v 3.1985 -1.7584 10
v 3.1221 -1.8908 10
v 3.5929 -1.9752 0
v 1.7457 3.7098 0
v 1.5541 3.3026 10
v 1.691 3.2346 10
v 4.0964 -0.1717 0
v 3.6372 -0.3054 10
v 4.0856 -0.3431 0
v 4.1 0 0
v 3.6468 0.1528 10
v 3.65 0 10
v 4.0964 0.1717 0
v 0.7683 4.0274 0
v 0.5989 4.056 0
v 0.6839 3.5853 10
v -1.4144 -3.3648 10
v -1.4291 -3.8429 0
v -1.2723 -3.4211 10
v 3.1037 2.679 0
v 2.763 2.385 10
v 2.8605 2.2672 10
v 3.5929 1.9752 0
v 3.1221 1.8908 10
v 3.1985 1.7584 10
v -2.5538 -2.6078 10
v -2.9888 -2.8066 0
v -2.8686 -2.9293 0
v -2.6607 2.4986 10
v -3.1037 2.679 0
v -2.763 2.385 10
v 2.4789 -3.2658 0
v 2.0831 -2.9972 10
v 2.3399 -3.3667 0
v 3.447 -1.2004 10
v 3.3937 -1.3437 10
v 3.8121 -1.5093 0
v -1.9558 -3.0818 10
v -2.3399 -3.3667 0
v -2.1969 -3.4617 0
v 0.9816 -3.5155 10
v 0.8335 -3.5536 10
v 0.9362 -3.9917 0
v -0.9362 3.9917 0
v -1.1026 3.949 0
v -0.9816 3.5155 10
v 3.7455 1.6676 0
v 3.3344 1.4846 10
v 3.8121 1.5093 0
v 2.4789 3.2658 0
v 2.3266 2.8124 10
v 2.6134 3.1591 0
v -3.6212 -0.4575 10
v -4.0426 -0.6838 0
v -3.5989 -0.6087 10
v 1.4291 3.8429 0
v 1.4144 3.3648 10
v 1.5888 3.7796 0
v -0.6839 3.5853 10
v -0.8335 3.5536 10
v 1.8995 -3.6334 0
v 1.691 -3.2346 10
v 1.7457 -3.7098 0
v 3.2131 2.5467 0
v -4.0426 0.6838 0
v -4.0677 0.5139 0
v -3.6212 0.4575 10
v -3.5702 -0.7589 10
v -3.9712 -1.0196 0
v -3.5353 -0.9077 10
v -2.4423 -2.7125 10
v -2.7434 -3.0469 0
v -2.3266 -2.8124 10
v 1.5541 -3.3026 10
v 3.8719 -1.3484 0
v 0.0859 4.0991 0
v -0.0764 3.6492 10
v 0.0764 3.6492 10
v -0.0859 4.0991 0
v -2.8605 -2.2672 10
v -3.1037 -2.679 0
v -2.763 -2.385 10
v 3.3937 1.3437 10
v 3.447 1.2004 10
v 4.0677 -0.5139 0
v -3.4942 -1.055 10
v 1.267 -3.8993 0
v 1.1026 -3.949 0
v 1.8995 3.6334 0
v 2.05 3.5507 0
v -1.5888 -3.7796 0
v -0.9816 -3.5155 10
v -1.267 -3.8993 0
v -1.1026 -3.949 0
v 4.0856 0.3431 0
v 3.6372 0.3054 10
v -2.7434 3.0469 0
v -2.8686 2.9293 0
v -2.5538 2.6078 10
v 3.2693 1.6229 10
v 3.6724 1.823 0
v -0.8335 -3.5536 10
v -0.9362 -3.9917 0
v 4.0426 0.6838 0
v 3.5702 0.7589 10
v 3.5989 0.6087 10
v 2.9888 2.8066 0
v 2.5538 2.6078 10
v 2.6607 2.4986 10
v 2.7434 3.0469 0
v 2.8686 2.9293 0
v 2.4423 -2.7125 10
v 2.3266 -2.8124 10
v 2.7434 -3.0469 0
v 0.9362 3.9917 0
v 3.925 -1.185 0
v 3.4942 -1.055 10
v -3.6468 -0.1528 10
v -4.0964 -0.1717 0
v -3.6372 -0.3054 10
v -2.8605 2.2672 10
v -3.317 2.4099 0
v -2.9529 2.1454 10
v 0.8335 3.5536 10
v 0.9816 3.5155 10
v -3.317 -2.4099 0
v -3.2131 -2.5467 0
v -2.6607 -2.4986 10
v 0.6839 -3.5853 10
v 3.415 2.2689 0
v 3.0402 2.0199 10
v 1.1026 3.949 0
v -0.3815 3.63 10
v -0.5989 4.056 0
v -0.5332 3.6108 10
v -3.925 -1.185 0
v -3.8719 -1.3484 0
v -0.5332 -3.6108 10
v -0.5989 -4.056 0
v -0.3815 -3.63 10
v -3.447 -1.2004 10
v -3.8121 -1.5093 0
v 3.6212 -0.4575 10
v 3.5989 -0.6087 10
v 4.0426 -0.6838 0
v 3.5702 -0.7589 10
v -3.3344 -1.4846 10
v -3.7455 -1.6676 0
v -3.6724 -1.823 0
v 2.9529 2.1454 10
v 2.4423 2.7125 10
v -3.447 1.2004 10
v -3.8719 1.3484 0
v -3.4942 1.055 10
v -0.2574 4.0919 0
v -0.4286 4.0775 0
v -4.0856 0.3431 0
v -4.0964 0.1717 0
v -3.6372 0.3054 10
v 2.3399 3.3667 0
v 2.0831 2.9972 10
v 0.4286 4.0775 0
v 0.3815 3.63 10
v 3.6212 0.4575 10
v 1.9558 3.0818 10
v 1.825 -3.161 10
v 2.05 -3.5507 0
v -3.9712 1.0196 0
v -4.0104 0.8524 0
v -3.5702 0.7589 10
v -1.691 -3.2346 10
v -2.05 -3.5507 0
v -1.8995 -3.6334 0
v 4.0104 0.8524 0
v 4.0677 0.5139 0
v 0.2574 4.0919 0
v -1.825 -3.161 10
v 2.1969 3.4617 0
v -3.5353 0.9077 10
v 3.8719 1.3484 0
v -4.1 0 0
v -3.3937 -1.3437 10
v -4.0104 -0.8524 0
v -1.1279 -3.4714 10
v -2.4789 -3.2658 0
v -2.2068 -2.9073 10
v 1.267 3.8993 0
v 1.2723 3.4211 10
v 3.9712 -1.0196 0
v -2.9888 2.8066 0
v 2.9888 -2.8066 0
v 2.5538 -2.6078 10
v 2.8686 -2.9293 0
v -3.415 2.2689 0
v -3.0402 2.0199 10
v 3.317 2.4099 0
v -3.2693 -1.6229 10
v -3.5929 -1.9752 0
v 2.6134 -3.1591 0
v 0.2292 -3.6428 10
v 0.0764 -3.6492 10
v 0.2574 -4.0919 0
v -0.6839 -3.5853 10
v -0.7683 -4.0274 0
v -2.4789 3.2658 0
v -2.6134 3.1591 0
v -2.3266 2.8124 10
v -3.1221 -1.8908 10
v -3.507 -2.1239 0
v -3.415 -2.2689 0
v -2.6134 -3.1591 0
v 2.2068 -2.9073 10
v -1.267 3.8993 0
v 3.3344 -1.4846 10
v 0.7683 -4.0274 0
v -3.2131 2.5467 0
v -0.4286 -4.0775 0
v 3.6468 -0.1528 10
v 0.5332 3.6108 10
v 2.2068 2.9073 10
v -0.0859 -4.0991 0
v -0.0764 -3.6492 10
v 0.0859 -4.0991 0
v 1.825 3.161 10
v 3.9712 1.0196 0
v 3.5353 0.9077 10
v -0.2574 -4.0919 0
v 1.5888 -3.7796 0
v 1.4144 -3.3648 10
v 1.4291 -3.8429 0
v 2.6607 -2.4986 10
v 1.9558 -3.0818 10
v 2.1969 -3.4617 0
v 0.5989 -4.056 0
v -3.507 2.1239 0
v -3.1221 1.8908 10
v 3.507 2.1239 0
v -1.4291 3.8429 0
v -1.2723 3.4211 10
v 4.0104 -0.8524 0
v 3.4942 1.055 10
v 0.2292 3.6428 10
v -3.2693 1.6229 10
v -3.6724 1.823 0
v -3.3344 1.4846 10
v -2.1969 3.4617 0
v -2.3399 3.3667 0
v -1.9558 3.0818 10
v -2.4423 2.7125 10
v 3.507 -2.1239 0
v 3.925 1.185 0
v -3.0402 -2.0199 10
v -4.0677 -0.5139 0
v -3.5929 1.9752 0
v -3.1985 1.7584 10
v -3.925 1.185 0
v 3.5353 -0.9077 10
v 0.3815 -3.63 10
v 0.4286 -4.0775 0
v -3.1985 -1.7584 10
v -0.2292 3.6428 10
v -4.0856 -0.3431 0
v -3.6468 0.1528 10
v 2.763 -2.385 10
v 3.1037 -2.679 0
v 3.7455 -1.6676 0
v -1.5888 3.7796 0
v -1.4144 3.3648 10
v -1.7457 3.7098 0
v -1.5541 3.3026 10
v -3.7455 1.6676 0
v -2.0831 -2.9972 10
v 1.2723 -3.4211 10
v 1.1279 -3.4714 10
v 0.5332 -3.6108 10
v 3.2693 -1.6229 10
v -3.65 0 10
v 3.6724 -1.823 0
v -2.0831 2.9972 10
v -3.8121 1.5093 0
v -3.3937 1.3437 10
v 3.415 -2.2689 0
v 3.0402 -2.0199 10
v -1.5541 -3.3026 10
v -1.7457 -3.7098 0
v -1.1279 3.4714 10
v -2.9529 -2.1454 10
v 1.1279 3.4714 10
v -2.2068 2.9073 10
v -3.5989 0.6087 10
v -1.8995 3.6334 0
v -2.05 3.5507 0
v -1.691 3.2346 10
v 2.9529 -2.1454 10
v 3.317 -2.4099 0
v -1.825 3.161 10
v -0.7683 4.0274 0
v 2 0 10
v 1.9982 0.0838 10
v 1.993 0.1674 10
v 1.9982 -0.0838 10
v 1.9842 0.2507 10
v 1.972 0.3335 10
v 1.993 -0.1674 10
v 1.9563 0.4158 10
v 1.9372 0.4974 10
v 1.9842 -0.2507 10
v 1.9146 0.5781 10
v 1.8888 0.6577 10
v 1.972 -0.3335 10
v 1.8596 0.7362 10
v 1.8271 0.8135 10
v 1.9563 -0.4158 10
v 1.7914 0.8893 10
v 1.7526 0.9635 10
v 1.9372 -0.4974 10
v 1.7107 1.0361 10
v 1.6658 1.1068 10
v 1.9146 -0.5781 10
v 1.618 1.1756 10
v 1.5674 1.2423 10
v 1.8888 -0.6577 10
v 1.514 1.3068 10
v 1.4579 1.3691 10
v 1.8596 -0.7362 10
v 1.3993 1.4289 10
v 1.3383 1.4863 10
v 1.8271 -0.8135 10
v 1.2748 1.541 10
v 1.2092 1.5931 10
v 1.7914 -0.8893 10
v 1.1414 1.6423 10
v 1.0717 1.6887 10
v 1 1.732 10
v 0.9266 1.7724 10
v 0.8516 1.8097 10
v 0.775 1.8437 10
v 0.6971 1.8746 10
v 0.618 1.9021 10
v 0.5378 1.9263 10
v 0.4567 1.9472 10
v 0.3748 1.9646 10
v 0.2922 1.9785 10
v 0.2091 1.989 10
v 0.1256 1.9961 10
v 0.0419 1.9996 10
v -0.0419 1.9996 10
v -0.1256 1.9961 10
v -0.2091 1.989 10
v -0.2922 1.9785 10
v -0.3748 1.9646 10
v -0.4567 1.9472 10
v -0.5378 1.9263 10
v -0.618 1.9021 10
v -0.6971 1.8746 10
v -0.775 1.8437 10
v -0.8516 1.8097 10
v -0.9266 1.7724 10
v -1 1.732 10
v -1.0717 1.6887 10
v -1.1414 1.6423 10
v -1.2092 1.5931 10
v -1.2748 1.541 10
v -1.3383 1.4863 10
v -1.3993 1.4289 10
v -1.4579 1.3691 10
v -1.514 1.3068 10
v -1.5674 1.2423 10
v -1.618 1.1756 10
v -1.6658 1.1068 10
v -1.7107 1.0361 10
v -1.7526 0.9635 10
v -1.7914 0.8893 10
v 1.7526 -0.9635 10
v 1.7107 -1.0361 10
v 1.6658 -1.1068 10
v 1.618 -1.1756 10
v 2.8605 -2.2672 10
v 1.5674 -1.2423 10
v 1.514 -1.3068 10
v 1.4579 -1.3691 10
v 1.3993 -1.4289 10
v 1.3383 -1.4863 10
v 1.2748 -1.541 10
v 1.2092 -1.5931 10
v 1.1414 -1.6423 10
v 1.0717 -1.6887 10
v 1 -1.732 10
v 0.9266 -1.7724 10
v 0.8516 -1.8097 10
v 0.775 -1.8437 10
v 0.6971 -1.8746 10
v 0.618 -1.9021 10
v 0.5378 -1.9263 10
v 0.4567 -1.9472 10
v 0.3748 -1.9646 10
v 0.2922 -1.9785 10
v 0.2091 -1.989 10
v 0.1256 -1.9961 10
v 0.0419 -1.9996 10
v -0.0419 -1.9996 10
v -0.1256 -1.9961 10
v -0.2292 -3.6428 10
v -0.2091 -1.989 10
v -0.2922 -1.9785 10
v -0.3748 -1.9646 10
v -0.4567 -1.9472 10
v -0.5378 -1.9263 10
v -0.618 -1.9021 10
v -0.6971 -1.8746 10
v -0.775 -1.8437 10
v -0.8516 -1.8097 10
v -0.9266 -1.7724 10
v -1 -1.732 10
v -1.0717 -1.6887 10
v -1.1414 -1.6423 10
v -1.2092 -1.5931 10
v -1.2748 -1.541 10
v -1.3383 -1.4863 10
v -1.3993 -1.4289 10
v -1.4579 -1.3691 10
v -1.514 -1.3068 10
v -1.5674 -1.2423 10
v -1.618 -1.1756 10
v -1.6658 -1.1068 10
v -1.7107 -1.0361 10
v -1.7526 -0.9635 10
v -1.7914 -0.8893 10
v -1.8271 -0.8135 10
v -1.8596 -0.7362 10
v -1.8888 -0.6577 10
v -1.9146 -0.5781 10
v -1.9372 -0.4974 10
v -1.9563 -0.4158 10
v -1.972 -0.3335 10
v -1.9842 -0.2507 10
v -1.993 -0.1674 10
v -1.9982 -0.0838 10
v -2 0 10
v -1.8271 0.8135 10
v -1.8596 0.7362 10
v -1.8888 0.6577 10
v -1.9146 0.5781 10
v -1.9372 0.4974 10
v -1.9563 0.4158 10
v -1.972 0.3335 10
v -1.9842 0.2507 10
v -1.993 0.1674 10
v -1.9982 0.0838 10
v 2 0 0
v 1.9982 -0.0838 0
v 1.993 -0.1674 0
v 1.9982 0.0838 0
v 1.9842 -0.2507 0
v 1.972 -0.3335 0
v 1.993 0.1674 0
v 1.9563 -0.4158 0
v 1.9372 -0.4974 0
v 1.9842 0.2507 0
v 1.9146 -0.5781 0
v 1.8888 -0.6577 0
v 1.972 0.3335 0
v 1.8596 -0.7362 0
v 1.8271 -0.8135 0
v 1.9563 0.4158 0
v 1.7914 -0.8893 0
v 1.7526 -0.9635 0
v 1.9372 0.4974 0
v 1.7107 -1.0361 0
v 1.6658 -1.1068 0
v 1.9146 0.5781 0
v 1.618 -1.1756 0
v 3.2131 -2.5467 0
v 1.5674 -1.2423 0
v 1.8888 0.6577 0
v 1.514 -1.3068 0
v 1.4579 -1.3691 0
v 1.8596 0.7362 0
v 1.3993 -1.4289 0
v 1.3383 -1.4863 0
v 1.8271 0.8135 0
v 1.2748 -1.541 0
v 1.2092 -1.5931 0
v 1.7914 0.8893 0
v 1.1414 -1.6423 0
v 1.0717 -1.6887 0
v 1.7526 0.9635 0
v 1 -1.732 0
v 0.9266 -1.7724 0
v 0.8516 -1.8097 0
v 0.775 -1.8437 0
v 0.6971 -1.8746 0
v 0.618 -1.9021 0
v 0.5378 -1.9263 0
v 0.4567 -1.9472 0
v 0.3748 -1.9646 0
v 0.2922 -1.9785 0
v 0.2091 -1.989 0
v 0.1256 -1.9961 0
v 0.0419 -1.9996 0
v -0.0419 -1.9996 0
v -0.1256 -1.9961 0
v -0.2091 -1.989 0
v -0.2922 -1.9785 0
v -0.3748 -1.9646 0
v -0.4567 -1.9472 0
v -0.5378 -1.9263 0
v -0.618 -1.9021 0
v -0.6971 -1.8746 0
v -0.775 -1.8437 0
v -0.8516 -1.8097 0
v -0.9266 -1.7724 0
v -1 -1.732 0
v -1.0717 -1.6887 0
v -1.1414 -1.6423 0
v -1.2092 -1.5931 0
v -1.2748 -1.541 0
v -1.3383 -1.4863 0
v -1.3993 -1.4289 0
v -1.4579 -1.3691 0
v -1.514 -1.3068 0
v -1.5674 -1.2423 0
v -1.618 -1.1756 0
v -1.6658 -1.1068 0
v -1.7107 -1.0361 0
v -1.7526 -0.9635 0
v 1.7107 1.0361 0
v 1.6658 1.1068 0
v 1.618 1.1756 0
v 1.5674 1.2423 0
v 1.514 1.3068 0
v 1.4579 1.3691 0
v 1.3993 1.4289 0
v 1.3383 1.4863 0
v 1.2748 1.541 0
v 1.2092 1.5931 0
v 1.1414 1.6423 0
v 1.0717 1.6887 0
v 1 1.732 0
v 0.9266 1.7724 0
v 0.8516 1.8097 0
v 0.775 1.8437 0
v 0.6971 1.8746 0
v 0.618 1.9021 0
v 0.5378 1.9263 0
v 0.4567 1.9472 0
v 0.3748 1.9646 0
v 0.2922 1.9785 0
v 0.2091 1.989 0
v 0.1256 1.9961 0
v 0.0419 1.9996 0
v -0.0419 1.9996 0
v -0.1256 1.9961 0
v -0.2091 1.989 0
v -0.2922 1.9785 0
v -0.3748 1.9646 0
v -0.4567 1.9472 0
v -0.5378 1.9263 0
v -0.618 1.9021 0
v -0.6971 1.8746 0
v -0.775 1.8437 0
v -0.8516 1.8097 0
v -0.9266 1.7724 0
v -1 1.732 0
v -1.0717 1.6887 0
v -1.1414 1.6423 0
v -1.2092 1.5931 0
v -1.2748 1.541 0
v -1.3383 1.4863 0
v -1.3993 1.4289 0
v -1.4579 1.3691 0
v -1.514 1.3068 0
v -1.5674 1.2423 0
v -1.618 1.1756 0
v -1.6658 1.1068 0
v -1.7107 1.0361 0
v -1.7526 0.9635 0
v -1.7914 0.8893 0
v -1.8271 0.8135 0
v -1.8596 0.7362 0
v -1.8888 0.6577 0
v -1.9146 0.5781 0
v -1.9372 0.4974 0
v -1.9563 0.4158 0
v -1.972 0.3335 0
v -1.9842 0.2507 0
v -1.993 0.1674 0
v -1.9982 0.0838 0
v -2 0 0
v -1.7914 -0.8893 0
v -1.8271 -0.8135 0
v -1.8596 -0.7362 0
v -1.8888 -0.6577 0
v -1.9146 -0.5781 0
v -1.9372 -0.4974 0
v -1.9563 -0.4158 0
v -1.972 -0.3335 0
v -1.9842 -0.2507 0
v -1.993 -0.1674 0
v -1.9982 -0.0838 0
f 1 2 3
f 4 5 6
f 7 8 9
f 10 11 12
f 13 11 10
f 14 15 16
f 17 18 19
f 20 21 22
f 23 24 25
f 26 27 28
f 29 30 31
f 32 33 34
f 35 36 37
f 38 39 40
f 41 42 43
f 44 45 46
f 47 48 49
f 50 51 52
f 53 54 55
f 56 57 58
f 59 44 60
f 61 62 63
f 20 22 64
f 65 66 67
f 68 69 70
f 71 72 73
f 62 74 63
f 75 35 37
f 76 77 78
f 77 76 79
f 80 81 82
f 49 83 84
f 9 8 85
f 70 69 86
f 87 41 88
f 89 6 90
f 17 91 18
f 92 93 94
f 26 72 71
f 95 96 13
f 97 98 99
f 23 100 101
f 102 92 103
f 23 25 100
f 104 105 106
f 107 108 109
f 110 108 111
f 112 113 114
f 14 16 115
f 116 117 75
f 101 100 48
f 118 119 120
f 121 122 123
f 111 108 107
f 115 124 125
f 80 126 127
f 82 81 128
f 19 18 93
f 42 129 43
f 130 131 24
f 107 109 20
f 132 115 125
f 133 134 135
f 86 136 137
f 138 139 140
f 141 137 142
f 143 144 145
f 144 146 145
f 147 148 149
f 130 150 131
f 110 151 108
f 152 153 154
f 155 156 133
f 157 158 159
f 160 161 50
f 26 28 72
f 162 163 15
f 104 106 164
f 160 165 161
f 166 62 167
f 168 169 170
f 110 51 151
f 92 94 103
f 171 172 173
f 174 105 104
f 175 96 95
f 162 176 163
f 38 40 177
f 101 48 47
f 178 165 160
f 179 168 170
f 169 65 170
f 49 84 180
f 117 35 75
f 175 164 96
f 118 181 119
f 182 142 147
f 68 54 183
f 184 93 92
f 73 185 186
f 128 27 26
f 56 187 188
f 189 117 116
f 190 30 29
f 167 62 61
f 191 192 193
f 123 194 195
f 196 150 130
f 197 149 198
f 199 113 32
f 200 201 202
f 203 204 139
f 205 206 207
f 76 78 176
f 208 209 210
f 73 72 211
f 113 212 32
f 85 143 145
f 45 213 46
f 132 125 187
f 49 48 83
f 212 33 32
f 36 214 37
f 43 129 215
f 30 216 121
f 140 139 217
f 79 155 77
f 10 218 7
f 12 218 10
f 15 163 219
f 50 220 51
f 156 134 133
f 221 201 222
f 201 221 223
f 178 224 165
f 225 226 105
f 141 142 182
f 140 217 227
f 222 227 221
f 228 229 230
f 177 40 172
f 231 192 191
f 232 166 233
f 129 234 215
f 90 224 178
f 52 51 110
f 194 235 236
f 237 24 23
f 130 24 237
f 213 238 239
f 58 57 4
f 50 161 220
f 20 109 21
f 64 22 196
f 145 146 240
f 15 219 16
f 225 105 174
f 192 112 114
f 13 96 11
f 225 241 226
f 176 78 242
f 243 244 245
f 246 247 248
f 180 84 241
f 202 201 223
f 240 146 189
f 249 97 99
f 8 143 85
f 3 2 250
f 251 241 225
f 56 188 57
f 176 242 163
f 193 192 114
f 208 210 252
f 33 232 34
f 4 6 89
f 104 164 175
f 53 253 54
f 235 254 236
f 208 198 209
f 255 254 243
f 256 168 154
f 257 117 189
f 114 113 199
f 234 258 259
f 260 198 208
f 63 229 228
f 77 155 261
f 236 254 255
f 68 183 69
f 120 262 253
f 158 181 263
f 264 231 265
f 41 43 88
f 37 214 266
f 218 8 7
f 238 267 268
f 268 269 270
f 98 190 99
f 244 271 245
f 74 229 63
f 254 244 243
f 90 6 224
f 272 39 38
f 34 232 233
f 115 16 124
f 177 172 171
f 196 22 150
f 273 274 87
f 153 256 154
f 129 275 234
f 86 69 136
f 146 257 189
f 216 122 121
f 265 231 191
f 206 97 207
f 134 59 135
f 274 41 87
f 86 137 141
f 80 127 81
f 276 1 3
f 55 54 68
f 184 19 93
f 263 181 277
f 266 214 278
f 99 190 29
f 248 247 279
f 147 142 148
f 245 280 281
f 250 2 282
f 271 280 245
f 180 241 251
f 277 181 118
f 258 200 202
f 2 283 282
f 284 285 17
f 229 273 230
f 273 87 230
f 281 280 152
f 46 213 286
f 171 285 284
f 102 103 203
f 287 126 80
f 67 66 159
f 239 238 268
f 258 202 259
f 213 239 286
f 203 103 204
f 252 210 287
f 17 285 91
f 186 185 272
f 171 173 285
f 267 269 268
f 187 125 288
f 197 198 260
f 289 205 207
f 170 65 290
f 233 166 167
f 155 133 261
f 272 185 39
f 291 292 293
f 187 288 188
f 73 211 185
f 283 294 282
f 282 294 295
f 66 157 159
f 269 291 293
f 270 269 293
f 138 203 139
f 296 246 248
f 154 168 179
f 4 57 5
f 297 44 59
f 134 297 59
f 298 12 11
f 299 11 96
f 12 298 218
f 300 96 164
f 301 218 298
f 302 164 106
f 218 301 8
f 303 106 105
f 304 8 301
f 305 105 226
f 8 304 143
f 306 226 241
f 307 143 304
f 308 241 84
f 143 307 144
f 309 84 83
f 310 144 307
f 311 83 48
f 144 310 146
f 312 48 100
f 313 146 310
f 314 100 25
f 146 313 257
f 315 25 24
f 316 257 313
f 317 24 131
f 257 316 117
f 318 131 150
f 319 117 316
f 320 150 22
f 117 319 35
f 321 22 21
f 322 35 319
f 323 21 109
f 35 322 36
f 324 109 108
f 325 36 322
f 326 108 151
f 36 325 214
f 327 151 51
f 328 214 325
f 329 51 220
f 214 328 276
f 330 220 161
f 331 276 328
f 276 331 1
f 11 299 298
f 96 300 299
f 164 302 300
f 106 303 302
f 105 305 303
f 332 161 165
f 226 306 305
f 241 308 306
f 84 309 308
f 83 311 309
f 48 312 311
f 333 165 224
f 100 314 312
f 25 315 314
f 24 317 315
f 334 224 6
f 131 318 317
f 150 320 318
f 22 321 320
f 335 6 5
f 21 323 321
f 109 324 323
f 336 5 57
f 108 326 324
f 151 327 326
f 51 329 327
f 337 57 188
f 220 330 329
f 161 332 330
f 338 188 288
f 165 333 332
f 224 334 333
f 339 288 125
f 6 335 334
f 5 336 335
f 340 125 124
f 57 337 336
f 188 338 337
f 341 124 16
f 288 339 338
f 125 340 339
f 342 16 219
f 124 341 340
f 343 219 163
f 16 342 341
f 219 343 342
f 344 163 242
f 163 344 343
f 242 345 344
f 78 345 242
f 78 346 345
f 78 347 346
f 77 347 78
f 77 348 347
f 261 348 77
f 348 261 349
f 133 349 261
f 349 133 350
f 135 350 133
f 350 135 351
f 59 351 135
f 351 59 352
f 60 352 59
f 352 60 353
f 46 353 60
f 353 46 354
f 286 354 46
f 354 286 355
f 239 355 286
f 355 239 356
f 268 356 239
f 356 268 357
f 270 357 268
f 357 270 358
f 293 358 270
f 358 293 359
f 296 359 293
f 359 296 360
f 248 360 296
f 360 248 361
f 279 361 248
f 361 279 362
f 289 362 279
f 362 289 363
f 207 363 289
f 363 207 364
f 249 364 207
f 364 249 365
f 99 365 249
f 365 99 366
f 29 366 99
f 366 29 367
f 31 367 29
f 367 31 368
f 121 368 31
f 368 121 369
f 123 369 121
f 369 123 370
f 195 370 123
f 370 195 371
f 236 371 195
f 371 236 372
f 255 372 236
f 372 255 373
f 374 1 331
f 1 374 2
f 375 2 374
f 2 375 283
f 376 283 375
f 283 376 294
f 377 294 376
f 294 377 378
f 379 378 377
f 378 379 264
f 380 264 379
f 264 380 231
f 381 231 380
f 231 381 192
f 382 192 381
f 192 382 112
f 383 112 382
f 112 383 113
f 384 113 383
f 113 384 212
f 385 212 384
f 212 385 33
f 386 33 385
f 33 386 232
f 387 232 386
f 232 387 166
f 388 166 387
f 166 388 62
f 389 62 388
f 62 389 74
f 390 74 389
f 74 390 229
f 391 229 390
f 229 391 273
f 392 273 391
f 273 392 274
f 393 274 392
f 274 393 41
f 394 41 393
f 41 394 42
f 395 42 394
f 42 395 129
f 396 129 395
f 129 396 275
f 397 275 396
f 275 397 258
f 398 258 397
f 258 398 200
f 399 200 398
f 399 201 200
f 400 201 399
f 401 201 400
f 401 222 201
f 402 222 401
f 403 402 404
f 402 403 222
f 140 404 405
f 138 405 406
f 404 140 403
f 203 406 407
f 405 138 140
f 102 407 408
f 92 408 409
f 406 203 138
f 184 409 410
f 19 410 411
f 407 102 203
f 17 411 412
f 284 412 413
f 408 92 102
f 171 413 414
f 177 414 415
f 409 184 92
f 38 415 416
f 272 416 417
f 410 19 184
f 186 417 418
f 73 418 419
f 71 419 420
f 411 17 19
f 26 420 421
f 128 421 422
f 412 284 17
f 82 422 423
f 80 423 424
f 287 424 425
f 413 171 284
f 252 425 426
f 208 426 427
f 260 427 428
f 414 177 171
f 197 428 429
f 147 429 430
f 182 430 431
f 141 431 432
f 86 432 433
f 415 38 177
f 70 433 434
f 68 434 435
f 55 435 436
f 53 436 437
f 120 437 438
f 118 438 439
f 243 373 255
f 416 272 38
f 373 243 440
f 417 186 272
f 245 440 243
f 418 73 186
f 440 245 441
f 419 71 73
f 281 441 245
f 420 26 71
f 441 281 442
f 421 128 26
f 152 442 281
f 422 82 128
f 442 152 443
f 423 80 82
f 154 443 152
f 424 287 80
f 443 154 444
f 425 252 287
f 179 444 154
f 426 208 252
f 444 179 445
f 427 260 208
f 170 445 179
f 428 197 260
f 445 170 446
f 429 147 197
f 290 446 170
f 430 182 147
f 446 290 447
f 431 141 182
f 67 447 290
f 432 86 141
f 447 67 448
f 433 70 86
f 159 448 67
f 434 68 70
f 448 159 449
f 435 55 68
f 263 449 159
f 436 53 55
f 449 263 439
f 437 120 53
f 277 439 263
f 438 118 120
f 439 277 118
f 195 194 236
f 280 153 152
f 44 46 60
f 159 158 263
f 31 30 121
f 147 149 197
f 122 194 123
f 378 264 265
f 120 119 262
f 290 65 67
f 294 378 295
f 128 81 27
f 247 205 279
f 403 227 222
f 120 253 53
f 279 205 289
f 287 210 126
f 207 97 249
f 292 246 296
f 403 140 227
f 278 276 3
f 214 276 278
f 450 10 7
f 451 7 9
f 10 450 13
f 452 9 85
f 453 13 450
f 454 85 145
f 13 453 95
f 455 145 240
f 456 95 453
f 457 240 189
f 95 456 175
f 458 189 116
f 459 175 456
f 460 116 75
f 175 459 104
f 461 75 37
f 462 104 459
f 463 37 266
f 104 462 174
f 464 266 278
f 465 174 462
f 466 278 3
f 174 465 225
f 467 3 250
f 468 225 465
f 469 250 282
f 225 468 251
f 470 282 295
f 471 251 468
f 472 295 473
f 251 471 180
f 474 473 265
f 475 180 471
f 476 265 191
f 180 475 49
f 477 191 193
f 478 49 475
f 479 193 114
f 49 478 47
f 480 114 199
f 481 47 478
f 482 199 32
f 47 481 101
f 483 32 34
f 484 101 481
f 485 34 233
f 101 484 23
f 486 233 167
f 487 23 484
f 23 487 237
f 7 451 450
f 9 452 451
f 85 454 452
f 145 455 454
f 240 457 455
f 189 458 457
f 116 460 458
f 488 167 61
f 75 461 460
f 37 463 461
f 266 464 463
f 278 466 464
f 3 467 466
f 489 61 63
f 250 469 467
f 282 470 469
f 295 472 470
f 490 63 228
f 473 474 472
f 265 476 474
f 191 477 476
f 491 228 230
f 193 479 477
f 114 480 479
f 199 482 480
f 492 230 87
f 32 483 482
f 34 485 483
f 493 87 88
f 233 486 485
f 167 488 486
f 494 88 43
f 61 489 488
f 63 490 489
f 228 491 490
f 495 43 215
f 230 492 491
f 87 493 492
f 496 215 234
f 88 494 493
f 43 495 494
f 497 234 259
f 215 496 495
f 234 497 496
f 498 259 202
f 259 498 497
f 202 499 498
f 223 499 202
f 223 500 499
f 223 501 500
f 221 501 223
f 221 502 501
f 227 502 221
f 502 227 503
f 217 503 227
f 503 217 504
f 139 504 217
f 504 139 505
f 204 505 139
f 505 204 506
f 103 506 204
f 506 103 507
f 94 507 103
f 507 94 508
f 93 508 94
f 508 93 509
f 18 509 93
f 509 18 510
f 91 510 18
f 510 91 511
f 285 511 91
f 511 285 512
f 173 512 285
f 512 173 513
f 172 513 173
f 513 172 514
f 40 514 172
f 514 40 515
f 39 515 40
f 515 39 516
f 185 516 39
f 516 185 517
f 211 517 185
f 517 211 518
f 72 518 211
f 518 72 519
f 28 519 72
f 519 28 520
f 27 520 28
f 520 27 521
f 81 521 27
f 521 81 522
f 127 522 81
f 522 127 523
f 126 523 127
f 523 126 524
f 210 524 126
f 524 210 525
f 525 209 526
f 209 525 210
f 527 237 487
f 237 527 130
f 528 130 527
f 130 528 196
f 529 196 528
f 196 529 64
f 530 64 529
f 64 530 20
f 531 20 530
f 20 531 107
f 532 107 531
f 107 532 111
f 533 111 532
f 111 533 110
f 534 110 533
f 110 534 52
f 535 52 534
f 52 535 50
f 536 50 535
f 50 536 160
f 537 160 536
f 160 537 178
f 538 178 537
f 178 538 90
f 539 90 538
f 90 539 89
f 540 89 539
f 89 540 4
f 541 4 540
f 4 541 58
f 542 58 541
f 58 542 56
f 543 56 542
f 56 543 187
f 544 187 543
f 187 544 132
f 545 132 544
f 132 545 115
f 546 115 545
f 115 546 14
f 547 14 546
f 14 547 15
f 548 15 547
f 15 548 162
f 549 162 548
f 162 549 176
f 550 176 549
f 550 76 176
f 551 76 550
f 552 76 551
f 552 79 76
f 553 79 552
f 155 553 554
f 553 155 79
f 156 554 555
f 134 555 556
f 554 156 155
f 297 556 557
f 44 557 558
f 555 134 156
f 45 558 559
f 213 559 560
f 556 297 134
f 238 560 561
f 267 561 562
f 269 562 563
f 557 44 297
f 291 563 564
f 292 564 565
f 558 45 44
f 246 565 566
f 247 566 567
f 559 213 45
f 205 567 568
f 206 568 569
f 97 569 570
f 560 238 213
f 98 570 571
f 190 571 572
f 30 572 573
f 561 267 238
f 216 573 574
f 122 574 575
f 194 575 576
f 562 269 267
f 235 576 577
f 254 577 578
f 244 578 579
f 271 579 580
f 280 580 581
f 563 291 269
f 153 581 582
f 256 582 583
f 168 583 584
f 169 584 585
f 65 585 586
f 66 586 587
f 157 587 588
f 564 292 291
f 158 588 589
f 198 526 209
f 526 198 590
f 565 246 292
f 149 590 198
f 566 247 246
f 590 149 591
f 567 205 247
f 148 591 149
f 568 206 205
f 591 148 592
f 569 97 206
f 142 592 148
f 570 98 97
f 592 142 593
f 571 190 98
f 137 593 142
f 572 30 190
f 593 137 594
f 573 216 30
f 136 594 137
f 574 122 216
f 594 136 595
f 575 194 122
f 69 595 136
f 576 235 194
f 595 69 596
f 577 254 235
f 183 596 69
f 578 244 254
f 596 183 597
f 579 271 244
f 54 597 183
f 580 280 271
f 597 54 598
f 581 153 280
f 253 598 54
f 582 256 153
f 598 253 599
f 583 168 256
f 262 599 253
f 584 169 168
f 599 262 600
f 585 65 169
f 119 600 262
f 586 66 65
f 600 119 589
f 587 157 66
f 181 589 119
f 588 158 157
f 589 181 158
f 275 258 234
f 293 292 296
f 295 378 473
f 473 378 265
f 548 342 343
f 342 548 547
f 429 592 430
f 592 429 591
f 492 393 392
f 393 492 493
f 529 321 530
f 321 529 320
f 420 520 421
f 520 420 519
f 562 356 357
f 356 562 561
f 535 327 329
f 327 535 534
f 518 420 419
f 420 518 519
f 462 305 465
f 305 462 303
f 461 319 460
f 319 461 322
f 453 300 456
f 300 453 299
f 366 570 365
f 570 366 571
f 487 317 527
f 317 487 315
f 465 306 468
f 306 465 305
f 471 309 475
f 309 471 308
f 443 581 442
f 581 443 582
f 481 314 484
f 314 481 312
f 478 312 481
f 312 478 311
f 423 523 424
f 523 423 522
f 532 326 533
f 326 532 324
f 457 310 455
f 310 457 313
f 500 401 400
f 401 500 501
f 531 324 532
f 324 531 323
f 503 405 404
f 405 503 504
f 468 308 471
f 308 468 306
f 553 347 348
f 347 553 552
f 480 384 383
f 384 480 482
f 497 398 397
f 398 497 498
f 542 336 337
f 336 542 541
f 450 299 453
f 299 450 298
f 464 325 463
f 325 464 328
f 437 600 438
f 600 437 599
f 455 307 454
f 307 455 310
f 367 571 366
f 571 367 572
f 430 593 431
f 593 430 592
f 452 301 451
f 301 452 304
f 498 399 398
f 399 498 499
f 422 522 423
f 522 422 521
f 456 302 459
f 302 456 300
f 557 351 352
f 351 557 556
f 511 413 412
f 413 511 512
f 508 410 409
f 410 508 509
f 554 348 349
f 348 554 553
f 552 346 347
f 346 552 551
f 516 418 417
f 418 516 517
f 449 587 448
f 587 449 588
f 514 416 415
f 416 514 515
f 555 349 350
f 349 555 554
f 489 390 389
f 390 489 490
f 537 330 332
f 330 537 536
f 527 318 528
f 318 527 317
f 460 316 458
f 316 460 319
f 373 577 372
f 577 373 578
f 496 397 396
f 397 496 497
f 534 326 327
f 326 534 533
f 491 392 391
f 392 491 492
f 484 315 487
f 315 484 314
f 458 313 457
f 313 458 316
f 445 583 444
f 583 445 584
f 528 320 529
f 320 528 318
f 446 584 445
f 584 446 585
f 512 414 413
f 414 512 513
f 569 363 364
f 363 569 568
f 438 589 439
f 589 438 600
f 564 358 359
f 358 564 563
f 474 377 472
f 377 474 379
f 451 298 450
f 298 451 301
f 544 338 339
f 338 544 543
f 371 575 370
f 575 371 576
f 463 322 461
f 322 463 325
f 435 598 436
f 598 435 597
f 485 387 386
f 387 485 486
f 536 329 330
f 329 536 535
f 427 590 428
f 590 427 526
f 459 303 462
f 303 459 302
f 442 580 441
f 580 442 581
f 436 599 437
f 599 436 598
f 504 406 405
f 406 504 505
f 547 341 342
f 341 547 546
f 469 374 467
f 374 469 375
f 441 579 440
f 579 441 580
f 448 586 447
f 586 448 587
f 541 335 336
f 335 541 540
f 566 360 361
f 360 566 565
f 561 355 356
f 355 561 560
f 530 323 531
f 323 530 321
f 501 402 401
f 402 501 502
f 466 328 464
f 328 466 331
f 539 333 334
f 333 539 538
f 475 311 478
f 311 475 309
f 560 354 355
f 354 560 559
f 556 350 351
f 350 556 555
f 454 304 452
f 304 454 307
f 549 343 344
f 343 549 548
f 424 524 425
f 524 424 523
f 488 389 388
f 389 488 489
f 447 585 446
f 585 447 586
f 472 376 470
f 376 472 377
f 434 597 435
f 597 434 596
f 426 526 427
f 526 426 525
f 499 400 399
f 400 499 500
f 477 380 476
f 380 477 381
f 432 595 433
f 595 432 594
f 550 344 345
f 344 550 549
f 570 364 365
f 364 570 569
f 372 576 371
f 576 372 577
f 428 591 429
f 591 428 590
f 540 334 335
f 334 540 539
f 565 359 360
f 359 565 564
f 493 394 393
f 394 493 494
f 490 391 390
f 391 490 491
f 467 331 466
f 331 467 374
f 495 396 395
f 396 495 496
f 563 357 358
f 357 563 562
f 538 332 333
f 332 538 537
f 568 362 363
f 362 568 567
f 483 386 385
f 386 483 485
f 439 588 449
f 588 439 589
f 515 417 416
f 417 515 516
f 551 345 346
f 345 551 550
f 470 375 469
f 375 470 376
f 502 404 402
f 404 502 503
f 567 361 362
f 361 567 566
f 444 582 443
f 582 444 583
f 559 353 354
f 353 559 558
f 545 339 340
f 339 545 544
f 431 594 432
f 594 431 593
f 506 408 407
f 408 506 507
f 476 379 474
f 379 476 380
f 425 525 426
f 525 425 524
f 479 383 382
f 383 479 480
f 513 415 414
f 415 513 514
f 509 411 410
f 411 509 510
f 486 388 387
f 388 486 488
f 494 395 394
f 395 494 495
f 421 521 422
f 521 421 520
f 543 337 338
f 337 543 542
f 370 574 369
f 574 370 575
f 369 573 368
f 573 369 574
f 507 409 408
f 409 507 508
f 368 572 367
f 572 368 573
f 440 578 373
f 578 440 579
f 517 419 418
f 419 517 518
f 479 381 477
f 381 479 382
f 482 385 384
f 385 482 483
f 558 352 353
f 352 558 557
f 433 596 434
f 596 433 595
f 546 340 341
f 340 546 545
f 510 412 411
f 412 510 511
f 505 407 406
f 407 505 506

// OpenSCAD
$fn = 150;

module frustum(d1, d2, h) {
    difference() {
        // 创建圆台的外形
        cylinder(h = h, r1 = d1 / 2, r2 = d2 / 2);
        
        // 从顶部中心挖一个直径为 11.9mm 的圆柱
        translate([0,0,-1])
        cylinder(h = 11.1, r = 4 / 2);
    }
}

// 设置圆台的参数
diameter_bottom = 8.2; // 底部直径
diameter_top = 7.3;    // 顶部直径
height = 10;         // 圆台高度

// 绘制圆台
frustum(diameter_bottom, diameter_top, height);
